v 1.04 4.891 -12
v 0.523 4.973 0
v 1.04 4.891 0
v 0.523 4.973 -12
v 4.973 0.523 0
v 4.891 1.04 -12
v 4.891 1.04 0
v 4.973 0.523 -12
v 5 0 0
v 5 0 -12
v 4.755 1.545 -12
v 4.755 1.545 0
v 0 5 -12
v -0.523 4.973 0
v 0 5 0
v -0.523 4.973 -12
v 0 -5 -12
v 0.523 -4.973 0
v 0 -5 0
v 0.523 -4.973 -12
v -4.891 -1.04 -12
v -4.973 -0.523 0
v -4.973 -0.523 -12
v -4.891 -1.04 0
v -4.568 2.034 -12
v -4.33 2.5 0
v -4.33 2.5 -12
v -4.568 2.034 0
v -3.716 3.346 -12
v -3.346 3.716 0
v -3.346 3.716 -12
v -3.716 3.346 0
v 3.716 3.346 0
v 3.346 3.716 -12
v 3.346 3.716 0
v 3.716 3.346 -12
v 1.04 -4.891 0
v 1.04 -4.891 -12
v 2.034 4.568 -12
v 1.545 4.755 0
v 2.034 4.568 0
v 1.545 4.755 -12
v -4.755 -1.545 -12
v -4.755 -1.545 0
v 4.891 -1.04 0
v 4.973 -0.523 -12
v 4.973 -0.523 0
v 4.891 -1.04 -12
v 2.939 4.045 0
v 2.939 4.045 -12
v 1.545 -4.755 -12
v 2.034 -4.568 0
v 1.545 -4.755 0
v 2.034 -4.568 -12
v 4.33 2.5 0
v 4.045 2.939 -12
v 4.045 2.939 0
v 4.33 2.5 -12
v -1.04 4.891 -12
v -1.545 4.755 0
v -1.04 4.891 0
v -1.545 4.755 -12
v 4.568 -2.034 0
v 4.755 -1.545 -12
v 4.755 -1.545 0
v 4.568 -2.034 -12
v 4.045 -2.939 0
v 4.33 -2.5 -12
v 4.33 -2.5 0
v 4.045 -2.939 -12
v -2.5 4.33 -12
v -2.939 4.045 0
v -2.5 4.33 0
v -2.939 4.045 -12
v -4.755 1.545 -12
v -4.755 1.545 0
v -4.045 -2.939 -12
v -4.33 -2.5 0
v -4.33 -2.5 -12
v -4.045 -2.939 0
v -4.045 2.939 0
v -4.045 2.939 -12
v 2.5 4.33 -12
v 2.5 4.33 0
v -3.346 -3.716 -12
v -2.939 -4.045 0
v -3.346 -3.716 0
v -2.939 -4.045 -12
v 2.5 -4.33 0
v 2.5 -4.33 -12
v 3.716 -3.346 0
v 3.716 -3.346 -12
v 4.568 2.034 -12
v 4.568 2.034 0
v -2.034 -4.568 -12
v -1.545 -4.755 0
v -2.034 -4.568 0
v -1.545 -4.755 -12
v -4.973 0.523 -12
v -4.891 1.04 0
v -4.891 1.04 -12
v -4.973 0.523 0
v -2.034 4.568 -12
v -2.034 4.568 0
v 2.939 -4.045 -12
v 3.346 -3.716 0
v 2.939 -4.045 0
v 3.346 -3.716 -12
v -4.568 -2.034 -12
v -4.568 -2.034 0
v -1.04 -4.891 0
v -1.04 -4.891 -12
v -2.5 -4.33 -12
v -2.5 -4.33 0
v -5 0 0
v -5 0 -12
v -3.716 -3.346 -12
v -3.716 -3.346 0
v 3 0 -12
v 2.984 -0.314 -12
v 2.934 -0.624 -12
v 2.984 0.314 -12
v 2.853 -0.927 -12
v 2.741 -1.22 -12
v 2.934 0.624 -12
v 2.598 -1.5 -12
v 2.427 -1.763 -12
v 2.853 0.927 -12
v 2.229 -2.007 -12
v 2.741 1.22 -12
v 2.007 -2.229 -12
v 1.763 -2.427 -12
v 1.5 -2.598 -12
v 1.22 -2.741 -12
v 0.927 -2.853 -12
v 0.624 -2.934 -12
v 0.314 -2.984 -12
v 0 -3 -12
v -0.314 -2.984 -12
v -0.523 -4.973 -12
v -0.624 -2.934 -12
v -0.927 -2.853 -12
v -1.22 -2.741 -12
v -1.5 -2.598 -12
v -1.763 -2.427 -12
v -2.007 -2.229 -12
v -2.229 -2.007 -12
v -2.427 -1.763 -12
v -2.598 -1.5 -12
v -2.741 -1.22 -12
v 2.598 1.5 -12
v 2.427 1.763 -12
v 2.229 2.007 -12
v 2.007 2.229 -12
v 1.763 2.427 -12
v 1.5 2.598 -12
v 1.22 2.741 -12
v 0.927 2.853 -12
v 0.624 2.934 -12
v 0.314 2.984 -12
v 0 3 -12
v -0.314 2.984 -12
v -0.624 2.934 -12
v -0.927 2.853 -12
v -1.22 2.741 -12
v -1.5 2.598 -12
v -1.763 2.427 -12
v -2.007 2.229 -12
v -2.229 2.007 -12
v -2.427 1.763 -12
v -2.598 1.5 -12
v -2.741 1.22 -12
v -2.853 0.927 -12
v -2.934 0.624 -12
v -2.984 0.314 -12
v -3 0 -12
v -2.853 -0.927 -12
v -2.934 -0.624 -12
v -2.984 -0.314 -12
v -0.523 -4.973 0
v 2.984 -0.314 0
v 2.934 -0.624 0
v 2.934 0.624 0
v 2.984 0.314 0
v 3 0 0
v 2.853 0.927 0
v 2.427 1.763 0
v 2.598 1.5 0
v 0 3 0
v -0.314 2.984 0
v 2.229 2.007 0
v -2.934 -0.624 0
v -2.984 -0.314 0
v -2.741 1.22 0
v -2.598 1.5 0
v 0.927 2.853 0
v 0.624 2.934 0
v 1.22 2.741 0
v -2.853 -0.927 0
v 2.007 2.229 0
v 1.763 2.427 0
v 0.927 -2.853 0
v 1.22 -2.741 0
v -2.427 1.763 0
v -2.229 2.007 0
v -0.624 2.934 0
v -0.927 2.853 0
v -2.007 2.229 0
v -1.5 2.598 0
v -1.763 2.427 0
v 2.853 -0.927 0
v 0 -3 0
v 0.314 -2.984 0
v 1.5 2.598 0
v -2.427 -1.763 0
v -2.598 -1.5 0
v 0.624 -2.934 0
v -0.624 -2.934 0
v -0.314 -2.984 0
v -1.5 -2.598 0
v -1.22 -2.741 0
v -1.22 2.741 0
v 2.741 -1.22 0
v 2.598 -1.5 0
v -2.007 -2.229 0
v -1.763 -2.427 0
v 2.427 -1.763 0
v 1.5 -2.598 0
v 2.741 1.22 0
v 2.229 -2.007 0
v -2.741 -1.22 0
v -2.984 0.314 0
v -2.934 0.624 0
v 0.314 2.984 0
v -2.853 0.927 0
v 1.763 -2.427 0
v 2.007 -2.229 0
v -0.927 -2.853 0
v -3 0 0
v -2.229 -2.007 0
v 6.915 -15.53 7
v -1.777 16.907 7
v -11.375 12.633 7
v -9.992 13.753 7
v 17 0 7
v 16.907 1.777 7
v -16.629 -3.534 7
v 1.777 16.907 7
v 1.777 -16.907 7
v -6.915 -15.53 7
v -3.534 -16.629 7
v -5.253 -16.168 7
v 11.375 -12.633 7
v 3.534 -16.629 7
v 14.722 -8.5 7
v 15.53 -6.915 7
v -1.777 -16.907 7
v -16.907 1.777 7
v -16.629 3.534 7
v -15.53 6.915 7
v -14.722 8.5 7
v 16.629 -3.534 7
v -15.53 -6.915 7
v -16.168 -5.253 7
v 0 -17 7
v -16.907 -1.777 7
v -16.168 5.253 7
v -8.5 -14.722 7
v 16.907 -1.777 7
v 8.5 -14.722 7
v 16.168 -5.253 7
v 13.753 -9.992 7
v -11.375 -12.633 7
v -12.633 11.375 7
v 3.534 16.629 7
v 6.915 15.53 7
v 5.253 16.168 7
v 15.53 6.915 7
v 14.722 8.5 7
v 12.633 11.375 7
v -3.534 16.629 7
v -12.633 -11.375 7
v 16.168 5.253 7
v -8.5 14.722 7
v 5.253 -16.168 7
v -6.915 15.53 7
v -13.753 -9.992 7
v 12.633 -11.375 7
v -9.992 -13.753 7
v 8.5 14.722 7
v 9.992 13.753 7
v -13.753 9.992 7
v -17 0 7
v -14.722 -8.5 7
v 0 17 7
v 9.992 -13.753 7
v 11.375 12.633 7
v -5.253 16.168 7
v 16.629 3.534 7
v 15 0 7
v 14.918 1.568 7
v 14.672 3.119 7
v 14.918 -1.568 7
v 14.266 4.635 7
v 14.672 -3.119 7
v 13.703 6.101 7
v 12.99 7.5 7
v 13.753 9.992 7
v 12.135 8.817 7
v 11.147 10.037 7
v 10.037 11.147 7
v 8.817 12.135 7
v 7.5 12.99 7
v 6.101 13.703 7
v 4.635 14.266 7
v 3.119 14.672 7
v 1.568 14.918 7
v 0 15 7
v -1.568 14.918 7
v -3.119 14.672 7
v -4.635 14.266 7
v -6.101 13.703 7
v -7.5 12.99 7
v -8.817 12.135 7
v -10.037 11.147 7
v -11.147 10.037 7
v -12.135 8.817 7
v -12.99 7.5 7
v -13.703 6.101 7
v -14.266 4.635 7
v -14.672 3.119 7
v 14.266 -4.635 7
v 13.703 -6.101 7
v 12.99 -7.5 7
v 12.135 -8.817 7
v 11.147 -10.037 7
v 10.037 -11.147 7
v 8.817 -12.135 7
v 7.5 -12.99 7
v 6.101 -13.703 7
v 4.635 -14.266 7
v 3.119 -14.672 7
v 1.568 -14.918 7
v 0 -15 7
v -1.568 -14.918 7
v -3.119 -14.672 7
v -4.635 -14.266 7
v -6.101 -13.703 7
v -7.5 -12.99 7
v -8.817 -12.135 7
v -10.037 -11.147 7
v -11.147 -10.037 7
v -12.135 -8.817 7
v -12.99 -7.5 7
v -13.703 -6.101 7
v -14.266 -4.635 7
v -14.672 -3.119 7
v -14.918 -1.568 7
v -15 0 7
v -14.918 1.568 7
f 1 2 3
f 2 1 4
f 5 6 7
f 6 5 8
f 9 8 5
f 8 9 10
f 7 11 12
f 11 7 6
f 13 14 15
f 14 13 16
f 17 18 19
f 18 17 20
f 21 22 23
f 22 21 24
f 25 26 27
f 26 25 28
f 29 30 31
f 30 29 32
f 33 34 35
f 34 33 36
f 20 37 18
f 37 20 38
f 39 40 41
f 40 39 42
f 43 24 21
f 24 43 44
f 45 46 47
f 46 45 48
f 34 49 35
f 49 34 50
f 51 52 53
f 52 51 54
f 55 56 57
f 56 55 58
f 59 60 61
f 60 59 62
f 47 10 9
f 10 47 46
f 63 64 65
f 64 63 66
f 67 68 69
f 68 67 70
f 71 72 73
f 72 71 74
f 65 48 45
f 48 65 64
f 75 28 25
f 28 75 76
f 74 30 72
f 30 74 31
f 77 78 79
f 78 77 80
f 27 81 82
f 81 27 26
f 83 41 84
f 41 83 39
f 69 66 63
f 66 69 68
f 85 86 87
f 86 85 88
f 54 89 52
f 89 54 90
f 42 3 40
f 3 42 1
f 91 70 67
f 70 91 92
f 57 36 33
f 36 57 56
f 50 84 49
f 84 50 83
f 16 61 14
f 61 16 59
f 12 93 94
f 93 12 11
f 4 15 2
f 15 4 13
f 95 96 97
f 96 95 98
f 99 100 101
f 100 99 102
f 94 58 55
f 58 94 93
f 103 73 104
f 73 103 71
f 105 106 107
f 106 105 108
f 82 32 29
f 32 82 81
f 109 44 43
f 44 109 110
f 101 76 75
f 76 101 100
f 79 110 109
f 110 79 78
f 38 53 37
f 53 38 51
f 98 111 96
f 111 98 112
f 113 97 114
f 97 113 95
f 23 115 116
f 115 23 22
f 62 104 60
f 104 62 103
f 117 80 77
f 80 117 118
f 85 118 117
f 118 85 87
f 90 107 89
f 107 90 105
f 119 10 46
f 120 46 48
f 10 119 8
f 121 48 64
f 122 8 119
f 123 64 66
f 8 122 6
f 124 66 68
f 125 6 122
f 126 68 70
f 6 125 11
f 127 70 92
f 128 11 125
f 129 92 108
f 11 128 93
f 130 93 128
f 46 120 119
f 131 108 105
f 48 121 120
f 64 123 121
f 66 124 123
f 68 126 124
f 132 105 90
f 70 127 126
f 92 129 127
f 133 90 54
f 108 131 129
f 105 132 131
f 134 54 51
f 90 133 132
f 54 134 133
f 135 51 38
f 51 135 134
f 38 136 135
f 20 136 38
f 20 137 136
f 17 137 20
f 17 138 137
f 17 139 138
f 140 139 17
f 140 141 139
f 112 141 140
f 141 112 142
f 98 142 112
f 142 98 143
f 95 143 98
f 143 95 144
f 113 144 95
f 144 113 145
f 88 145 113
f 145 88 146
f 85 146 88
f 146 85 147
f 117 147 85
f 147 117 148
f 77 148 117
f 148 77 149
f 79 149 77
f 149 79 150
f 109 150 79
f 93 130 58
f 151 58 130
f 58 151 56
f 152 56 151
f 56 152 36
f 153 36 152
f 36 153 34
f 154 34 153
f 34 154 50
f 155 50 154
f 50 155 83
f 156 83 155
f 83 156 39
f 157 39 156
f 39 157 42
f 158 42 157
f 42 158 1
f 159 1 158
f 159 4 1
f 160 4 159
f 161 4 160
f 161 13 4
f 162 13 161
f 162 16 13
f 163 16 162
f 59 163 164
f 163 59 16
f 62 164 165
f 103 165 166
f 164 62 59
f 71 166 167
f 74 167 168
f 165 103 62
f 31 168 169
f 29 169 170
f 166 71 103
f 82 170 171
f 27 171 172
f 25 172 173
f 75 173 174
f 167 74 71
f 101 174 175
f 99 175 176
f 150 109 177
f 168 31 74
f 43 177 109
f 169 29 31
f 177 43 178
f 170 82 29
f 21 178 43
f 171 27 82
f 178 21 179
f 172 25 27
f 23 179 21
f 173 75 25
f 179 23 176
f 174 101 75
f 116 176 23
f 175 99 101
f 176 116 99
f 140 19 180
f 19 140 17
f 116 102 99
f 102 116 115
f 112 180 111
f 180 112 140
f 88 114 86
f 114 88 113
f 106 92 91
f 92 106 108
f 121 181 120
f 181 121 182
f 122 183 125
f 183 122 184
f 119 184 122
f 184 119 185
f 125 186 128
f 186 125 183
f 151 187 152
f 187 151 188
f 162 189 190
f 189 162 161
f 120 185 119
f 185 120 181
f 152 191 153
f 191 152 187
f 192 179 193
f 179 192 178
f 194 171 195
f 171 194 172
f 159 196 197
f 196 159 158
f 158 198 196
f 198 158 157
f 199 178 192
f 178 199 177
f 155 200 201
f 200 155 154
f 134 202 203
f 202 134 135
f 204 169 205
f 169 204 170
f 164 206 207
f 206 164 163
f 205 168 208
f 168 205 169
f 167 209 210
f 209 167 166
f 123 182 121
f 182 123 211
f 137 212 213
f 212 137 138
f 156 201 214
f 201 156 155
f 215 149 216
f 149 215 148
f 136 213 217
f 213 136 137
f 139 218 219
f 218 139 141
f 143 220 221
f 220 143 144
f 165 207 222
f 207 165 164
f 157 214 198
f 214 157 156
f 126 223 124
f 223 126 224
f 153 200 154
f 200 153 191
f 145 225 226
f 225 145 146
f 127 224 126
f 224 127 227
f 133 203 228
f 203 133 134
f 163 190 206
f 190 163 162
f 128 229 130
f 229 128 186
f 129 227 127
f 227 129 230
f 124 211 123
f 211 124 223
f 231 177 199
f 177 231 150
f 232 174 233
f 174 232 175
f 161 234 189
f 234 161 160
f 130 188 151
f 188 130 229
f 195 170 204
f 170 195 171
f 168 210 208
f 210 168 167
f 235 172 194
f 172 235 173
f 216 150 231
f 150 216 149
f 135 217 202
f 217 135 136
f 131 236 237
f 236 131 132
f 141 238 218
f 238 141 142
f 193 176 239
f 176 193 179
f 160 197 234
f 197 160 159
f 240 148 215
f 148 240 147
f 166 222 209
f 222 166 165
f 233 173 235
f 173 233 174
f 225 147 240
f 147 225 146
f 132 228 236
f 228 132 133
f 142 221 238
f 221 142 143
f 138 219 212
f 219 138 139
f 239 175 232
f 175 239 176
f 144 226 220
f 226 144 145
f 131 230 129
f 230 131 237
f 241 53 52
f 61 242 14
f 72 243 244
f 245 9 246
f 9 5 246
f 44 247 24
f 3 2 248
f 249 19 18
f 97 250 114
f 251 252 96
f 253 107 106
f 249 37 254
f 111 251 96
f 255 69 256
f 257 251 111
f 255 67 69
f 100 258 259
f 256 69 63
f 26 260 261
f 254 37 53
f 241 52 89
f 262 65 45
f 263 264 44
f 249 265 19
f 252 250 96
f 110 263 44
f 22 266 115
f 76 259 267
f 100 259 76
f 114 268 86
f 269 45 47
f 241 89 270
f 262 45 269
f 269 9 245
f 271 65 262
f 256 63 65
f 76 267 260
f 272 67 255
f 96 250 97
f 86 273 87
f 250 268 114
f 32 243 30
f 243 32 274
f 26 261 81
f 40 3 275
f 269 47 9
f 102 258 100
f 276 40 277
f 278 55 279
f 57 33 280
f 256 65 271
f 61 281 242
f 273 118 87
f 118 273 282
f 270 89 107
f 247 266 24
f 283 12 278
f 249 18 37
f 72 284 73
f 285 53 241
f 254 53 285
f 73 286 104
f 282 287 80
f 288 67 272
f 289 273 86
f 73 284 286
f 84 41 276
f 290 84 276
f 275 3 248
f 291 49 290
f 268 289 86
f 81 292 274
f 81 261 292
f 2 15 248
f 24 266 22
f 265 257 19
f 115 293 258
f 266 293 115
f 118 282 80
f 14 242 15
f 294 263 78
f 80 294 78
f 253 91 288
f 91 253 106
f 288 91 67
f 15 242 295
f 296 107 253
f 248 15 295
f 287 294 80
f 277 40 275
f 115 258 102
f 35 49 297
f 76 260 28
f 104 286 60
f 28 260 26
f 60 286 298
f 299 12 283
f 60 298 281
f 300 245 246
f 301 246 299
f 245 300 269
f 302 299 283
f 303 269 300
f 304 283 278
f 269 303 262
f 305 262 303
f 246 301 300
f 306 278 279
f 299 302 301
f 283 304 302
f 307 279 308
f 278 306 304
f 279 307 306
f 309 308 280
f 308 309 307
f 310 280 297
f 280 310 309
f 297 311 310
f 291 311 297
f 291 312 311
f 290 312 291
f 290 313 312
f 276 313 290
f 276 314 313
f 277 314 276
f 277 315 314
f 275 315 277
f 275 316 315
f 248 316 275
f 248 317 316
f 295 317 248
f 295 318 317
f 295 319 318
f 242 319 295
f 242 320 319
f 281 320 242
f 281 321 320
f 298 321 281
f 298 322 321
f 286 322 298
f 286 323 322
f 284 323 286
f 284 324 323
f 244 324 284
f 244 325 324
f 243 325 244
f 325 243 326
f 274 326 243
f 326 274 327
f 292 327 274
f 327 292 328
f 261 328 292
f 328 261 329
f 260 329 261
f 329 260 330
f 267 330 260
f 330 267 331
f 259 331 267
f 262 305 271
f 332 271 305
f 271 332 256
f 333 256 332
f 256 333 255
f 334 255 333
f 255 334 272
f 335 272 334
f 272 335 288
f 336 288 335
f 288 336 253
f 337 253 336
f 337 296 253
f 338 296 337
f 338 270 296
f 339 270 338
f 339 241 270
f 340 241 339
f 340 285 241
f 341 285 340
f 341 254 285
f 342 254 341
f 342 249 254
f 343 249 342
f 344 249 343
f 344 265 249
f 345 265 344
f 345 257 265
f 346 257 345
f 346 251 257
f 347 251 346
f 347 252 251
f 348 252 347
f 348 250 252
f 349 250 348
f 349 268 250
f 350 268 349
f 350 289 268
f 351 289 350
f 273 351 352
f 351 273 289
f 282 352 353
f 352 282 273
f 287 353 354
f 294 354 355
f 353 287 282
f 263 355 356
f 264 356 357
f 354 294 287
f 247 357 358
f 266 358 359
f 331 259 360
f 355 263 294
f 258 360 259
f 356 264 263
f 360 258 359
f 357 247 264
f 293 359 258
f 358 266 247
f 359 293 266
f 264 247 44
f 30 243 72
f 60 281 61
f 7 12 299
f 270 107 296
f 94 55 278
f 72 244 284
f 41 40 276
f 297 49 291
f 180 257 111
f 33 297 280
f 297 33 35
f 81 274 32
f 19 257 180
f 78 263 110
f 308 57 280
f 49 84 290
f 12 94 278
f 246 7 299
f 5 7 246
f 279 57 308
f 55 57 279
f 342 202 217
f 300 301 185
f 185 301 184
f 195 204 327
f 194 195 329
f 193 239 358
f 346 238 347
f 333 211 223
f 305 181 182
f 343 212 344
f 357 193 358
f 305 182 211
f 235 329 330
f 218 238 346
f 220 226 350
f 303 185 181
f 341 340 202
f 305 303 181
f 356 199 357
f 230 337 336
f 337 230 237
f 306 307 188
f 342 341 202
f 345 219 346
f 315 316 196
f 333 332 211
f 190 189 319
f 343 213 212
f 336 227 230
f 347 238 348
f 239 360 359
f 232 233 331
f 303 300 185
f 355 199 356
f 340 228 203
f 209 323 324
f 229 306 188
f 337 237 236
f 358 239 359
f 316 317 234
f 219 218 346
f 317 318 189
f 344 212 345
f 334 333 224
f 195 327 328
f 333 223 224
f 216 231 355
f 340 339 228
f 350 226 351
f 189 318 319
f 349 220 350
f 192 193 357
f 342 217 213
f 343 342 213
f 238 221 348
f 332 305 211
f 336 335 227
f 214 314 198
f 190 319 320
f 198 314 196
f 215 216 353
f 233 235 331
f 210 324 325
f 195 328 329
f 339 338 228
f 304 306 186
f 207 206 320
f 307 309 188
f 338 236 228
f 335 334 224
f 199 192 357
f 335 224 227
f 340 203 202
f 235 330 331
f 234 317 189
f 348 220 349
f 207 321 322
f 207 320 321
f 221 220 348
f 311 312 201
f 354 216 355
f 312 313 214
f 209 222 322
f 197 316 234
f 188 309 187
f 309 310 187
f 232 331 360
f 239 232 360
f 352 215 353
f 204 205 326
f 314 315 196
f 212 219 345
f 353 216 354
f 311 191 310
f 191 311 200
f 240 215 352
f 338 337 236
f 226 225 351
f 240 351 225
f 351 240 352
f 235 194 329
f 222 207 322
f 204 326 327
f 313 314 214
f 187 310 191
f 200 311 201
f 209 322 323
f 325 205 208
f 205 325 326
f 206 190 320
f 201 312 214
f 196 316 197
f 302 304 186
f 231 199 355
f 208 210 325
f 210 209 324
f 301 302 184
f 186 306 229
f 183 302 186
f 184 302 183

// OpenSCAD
// Parameters
//Aussendurchmesser unten
d_u_a =5; //[2:0.5:30]
//Innendurchmesser unten
d_u_i =3; //[0.1:0.1:29]
//"Laenge des Rohres"
h_u = 12; //[1:0.5:70]

//Aussendurchmesser oben
d_o_a = 17; //[5:0.5:40]
//Innendurchmesser unten
d_o_i =15; //[4:0.5:39]
//Hoehe des "Trichters"
h_o = 7; //[3:0.5:70]


//Rundung
ecken=60; //[2:360]

/* [Hidden] */
$fn=ecken; //[1:360]

module oben(){
      difference(){
        cylinder(h_o, d_u_a, d_o_a, false);
        cylinder(h_o, d_u_i, d_o_i, false);
    }
}

module unten(){
    translate([0,0,-h_u])
    difference(){
        cylinder(h_u, d_u_a, d_u_a, false);
        cylinder(h_u, d_u_i, d_u_i, false);
    }
}

unten();
oben();
